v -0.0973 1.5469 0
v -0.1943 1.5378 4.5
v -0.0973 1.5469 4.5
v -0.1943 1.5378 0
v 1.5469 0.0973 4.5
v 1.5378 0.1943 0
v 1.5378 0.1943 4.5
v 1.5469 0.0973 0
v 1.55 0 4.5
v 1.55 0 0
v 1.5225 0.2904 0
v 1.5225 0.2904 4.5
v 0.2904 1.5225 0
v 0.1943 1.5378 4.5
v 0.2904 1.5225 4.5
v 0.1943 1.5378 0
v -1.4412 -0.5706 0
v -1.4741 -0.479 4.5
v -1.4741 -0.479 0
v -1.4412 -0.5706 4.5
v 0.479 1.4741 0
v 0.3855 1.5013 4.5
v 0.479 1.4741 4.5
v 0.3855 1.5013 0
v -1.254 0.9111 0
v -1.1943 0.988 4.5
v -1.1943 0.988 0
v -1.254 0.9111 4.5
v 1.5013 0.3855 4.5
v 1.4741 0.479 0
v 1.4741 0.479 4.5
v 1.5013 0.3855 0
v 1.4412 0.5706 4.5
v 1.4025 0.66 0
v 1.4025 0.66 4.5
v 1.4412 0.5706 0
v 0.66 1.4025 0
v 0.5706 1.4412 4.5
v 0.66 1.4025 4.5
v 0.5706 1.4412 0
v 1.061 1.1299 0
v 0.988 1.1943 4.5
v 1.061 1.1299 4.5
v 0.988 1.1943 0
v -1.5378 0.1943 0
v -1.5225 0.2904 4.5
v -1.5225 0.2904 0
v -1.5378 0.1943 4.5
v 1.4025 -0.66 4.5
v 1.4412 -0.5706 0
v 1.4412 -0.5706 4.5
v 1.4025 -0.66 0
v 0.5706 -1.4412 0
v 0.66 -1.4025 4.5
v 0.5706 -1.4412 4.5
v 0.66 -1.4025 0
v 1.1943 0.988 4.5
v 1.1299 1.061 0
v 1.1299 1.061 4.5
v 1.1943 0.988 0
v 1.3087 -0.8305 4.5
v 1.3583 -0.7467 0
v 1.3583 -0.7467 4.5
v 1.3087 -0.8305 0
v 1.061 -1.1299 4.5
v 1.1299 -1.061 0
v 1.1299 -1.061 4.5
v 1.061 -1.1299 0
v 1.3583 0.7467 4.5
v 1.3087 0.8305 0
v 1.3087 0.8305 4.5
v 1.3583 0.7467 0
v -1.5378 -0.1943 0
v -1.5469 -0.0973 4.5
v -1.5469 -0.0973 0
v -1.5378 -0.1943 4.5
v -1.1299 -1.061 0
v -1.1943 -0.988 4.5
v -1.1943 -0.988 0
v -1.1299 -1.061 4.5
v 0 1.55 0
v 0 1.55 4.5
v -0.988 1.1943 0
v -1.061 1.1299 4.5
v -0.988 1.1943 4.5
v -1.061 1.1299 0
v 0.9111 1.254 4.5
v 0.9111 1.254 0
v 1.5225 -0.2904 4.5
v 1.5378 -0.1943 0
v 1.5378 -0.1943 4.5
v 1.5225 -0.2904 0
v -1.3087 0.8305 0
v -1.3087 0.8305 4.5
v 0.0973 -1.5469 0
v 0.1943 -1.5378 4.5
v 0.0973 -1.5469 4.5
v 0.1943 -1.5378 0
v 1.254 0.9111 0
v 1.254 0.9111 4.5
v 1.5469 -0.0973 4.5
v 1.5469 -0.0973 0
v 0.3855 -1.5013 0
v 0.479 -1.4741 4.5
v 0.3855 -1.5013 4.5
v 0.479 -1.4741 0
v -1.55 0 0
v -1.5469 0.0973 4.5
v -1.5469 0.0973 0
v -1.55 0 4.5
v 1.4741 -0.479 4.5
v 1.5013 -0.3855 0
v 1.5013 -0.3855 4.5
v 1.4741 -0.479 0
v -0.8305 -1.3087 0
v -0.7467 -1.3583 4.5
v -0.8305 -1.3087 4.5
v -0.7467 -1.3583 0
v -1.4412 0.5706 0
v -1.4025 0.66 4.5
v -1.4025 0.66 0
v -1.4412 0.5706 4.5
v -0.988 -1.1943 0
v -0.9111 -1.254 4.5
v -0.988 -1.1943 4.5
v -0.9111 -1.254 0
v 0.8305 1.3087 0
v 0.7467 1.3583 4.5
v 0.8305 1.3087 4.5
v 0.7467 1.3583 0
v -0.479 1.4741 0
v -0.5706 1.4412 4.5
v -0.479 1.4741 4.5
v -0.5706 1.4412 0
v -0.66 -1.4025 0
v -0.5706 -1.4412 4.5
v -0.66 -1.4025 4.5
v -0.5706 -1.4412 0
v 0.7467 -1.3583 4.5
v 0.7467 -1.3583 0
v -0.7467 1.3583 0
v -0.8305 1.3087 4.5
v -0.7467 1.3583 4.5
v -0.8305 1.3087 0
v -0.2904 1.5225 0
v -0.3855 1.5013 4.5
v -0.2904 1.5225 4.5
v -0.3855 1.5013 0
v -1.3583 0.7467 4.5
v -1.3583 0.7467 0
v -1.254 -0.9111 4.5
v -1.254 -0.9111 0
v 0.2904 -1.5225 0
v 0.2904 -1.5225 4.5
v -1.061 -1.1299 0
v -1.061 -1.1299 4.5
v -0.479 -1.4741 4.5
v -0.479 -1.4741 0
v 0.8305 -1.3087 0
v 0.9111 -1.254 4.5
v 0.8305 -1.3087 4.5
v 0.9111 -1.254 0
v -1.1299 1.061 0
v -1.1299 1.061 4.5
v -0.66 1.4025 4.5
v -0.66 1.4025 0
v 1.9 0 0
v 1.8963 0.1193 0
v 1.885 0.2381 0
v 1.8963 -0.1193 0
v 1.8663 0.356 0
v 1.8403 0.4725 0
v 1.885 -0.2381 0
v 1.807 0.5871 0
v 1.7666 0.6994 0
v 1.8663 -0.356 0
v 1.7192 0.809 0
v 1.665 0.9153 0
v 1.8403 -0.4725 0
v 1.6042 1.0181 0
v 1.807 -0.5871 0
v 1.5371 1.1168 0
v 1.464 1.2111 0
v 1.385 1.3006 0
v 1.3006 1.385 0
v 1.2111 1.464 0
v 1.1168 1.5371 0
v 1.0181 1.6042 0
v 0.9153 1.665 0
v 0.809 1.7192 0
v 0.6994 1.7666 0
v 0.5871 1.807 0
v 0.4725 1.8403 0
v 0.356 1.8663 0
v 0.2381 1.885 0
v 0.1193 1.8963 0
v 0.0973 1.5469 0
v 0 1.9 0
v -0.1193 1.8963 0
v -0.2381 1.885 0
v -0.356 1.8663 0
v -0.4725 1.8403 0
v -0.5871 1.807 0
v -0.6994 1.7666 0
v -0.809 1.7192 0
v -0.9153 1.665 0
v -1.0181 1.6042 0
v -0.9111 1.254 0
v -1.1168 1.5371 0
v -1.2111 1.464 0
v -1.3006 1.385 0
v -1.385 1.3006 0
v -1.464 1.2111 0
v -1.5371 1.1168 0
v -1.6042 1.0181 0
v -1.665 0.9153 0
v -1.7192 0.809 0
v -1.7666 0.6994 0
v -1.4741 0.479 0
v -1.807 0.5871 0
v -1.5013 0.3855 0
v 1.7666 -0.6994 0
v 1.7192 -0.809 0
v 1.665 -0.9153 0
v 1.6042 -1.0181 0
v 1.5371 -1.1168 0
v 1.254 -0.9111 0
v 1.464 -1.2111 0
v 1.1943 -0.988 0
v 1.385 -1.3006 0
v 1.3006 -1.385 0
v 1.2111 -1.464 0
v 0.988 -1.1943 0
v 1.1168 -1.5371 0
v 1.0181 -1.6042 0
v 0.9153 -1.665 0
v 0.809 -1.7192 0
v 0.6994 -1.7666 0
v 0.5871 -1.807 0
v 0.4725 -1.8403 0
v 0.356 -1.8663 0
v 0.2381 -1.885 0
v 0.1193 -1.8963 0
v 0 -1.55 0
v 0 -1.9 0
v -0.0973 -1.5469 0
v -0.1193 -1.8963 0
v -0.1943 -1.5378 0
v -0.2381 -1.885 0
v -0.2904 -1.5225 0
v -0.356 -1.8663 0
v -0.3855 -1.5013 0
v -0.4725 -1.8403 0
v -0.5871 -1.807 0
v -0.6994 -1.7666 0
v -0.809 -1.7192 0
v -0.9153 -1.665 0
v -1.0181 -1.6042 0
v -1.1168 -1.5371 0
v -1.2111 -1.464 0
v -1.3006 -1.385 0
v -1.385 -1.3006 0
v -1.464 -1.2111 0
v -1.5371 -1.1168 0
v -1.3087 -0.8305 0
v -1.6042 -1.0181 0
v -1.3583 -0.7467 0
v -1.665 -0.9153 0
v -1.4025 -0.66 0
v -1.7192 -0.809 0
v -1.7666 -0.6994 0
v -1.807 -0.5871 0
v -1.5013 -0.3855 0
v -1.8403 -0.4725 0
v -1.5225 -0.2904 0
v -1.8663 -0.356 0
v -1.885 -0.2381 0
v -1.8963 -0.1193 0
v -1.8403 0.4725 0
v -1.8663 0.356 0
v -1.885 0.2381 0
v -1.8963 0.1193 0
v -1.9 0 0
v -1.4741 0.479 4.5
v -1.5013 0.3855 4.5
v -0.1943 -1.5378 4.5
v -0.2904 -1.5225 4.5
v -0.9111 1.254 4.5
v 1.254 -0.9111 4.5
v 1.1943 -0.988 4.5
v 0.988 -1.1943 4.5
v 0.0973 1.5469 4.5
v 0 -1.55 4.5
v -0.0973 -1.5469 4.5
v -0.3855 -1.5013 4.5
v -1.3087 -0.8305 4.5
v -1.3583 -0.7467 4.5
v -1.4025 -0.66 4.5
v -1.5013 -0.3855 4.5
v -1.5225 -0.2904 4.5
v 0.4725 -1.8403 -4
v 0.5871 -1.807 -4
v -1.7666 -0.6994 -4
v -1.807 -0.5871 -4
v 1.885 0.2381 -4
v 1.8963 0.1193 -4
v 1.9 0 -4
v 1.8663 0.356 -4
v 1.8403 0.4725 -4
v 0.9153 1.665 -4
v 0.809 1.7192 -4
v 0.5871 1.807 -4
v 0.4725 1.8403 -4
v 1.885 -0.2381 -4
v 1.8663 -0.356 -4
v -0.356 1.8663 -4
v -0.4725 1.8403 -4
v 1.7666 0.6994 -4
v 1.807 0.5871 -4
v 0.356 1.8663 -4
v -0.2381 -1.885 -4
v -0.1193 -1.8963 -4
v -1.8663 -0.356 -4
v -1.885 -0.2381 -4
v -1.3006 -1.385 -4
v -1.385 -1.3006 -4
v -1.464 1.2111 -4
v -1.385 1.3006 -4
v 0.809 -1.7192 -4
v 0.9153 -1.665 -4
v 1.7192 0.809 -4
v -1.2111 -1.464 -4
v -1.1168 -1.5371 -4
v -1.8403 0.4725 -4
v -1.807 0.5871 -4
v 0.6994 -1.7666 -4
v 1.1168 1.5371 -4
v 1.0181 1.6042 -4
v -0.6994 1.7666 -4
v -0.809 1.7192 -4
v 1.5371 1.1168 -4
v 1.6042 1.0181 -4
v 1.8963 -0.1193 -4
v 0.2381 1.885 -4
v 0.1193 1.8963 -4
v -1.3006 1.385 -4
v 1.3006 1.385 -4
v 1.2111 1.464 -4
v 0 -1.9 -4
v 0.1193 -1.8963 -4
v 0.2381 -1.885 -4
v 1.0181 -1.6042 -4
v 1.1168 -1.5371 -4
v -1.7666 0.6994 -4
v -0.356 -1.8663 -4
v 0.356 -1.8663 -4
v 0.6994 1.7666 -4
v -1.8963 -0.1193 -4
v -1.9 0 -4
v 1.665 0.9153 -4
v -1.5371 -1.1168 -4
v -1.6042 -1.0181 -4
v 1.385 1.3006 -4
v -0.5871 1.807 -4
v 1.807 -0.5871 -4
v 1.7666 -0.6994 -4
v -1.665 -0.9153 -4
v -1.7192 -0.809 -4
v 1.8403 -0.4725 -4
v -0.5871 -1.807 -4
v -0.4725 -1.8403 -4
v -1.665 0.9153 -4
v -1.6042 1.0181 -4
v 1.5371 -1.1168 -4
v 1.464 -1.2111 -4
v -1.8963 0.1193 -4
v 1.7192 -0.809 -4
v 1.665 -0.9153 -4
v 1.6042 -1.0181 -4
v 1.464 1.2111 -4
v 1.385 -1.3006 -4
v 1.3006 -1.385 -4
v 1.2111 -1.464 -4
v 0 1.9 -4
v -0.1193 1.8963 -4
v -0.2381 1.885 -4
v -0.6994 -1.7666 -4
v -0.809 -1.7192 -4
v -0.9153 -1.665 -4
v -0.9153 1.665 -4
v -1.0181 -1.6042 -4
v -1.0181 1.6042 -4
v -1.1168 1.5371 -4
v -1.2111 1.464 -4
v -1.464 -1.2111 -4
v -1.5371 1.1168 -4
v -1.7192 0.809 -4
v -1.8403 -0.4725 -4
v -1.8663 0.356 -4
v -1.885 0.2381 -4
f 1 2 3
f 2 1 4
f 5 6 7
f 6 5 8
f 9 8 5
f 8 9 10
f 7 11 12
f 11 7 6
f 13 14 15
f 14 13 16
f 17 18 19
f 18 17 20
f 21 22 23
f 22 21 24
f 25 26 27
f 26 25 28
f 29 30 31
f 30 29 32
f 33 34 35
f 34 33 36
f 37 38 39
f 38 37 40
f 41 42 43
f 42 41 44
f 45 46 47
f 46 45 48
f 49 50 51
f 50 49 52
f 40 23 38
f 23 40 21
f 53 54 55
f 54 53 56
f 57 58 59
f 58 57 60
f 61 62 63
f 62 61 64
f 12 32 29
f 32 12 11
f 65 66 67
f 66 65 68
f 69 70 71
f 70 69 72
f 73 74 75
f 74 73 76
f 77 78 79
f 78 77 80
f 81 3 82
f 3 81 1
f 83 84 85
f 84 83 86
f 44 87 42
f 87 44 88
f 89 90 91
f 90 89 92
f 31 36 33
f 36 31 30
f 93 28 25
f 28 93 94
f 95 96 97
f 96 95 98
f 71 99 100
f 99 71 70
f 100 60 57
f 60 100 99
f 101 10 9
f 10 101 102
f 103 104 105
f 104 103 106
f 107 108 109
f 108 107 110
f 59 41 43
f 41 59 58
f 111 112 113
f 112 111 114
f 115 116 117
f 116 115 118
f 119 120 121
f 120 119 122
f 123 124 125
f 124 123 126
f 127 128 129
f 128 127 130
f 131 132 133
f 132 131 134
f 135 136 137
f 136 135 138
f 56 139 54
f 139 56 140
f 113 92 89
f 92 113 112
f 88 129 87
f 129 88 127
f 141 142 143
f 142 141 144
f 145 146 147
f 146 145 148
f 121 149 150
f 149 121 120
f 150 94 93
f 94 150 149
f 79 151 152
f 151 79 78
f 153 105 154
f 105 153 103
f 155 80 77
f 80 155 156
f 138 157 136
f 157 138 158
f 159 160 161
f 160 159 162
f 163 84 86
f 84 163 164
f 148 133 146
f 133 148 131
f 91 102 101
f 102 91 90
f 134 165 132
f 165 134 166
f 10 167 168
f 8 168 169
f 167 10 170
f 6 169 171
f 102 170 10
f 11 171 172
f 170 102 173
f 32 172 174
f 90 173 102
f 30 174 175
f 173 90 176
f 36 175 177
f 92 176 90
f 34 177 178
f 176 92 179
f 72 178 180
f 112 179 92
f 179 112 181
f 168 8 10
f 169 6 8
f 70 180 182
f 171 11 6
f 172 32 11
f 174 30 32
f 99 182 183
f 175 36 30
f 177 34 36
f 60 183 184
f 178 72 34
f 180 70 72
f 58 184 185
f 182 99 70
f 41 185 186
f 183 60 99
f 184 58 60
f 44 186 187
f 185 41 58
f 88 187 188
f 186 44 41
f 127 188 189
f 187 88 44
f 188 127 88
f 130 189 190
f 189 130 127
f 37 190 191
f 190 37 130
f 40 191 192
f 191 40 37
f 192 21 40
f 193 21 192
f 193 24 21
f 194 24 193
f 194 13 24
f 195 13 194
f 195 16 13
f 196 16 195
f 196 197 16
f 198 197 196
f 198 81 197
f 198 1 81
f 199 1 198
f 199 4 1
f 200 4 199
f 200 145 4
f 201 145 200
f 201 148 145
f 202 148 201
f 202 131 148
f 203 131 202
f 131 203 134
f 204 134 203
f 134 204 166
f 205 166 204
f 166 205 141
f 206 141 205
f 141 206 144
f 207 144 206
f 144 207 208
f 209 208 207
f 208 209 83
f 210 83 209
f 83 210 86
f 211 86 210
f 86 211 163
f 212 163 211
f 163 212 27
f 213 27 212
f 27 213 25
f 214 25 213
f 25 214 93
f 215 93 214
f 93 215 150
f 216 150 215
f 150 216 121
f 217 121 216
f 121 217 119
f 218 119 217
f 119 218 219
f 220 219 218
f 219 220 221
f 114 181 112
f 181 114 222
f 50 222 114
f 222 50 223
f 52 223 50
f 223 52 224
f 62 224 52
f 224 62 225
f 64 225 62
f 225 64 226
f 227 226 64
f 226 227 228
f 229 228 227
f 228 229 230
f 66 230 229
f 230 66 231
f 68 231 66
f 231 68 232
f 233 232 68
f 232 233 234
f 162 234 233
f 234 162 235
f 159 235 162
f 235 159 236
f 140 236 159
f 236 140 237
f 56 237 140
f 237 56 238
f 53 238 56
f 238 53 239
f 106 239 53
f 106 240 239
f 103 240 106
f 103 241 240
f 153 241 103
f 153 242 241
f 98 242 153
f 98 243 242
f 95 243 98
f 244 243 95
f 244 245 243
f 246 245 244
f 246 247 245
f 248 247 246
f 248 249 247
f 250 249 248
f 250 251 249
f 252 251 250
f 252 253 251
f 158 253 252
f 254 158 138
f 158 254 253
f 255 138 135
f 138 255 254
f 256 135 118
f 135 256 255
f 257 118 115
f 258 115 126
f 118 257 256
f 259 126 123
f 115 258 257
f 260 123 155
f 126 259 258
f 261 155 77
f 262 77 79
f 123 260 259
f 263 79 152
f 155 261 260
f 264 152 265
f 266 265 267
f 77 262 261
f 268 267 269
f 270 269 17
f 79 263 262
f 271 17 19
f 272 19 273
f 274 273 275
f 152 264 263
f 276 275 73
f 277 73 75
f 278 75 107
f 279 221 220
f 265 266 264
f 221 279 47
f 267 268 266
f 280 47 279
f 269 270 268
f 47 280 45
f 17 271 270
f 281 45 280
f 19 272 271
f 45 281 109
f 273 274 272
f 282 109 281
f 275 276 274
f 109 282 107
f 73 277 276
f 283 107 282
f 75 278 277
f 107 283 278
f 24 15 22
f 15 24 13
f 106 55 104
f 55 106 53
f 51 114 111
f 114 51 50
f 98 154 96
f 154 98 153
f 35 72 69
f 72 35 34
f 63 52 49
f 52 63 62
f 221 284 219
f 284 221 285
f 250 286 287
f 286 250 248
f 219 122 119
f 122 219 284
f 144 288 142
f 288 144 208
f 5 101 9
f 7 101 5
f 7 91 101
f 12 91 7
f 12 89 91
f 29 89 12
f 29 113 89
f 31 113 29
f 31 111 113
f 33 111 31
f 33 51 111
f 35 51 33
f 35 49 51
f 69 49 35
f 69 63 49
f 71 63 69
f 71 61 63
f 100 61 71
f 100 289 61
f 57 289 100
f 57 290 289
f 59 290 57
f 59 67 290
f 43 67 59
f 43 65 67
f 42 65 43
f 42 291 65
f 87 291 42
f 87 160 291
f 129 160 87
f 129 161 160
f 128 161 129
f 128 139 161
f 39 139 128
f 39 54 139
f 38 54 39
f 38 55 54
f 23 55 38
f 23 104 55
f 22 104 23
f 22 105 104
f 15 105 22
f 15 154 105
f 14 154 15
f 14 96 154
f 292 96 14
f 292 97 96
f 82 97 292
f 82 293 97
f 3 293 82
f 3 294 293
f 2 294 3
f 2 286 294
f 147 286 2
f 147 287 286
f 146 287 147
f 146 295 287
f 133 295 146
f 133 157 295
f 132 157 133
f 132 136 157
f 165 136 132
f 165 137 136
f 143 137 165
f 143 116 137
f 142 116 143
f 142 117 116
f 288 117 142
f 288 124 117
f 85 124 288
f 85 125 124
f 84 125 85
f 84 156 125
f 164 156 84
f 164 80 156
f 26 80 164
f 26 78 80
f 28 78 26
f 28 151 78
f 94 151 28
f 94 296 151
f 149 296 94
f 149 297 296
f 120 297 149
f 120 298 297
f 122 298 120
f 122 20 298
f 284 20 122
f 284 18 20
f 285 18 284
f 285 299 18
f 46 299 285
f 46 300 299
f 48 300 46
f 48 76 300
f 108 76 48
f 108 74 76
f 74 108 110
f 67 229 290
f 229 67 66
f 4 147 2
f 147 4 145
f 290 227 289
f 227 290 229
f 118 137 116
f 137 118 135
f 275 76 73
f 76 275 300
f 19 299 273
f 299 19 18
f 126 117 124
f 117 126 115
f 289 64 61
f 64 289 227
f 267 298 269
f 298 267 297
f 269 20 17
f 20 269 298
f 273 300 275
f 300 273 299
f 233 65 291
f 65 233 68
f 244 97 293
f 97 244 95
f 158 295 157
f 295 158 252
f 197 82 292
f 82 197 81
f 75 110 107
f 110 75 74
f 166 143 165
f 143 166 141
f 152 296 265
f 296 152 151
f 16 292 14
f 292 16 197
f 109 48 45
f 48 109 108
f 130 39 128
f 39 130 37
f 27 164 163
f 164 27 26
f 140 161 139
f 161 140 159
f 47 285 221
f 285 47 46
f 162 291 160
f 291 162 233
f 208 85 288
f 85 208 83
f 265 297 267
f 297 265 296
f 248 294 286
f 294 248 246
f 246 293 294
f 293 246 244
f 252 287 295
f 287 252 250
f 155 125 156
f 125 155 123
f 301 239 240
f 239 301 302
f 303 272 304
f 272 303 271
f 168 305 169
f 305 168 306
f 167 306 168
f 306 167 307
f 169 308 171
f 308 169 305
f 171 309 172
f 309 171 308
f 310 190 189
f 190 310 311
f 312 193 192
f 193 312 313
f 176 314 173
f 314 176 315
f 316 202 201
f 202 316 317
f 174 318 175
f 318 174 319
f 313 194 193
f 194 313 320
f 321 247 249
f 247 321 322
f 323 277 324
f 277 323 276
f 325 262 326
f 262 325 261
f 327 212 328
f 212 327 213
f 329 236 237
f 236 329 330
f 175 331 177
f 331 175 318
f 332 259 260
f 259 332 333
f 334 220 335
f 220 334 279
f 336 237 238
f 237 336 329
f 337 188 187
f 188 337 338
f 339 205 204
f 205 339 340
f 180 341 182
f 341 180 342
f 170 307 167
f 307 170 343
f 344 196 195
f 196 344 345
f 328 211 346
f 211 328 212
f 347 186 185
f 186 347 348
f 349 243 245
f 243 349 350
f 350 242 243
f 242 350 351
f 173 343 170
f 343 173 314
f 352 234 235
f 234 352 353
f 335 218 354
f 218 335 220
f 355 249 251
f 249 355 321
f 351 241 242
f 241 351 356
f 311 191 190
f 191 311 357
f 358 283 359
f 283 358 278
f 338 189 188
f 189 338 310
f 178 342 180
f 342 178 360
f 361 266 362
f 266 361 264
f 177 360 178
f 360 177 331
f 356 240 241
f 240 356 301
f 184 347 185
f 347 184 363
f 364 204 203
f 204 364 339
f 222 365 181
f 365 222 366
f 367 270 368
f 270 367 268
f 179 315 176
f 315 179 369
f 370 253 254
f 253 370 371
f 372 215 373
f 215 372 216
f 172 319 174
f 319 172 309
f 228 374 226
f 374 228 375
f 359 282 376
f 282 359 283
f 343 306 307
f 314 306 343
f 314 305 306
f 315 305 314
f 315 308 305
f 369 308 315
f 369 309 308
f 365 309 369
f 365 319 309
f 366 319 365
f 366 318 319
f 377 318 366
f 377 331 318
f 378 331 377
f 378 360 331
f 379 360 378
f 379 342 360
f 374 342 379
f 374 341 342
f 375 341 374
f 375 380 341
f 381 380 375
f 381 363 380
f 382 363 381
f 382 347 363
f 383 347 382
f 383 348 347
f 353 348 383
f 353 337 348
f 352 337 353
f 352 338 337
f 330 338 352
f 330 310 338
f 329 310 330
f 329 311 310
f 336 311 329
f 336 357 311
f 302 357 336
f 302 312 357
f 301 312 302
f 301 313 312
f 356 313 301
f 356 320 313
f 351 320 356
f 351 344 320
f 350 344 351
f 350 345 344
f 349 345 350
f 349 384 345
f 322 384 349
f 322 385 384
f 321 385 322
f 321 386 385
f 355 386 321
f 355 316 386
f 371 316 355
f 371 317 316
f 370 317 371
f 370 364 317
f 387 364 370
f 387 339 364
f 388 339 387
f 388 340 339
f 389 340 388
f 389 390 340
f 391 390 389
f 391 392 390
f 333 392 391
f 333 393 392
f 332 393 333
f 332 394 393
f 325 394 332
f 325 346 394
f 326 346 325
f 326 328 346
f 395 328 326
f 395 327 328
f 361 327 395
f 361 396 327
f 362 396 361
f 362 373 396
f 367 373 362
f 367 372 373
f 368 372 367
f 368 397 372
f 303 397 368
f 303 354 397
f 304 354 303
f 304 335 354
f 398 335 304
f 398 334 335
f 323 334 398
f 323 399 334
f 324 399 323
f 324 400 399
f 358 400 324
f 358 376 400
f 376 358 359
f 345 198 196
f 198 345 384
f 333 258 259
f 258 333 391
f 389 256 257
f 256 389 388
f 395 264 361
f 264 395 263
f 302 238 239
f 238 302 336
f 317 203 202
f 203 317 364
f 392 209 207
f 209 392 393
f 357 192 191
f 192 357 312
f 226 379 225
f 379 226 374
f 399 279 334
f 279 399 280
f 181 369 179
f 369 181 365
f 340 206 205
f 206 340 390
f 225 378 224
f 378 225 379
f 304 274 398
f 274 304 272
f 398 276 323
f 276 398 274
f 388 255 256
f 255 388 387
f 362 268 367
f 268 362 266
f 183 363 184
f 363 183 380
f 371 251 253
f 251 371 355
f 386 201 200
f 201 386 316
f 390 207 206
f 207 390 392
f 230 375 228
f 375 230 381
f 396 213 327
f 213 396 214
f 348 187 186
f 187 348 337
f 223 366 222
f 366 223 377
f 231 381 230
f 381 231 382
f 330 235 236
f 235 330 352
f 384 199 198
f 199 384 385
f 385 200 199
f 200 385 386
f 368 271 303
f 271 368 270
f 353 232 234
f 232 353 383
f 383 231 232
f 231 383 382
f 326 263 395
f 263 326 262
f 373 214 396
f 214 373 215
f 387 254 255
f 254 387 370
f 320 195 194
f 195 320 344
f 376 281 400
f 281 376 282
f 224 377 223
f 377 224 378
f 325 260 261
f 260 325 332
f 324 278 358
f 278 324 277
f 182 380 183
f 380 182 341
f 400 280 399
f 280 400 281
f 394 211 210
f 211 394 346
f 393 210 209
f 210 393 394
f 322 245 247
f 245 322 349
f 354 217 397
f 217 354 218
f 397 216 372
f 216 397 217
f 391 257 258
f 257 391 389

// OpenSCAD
tolerance = 0.05;
$fn = $preview ? 20 : 100;

module led(d = 3, flange_d = undef) {
    flange_d = flange_d ? flange_d : d + 0.7;
    // main led part, without flange
    cylinder(d = d + (2 * tolerance), h = d*1.5);

    // flange and hole
    translate([0, 0, -4])
    cylinder(d = flange_d + (2 * tolerance), h = 4);
}

led();
